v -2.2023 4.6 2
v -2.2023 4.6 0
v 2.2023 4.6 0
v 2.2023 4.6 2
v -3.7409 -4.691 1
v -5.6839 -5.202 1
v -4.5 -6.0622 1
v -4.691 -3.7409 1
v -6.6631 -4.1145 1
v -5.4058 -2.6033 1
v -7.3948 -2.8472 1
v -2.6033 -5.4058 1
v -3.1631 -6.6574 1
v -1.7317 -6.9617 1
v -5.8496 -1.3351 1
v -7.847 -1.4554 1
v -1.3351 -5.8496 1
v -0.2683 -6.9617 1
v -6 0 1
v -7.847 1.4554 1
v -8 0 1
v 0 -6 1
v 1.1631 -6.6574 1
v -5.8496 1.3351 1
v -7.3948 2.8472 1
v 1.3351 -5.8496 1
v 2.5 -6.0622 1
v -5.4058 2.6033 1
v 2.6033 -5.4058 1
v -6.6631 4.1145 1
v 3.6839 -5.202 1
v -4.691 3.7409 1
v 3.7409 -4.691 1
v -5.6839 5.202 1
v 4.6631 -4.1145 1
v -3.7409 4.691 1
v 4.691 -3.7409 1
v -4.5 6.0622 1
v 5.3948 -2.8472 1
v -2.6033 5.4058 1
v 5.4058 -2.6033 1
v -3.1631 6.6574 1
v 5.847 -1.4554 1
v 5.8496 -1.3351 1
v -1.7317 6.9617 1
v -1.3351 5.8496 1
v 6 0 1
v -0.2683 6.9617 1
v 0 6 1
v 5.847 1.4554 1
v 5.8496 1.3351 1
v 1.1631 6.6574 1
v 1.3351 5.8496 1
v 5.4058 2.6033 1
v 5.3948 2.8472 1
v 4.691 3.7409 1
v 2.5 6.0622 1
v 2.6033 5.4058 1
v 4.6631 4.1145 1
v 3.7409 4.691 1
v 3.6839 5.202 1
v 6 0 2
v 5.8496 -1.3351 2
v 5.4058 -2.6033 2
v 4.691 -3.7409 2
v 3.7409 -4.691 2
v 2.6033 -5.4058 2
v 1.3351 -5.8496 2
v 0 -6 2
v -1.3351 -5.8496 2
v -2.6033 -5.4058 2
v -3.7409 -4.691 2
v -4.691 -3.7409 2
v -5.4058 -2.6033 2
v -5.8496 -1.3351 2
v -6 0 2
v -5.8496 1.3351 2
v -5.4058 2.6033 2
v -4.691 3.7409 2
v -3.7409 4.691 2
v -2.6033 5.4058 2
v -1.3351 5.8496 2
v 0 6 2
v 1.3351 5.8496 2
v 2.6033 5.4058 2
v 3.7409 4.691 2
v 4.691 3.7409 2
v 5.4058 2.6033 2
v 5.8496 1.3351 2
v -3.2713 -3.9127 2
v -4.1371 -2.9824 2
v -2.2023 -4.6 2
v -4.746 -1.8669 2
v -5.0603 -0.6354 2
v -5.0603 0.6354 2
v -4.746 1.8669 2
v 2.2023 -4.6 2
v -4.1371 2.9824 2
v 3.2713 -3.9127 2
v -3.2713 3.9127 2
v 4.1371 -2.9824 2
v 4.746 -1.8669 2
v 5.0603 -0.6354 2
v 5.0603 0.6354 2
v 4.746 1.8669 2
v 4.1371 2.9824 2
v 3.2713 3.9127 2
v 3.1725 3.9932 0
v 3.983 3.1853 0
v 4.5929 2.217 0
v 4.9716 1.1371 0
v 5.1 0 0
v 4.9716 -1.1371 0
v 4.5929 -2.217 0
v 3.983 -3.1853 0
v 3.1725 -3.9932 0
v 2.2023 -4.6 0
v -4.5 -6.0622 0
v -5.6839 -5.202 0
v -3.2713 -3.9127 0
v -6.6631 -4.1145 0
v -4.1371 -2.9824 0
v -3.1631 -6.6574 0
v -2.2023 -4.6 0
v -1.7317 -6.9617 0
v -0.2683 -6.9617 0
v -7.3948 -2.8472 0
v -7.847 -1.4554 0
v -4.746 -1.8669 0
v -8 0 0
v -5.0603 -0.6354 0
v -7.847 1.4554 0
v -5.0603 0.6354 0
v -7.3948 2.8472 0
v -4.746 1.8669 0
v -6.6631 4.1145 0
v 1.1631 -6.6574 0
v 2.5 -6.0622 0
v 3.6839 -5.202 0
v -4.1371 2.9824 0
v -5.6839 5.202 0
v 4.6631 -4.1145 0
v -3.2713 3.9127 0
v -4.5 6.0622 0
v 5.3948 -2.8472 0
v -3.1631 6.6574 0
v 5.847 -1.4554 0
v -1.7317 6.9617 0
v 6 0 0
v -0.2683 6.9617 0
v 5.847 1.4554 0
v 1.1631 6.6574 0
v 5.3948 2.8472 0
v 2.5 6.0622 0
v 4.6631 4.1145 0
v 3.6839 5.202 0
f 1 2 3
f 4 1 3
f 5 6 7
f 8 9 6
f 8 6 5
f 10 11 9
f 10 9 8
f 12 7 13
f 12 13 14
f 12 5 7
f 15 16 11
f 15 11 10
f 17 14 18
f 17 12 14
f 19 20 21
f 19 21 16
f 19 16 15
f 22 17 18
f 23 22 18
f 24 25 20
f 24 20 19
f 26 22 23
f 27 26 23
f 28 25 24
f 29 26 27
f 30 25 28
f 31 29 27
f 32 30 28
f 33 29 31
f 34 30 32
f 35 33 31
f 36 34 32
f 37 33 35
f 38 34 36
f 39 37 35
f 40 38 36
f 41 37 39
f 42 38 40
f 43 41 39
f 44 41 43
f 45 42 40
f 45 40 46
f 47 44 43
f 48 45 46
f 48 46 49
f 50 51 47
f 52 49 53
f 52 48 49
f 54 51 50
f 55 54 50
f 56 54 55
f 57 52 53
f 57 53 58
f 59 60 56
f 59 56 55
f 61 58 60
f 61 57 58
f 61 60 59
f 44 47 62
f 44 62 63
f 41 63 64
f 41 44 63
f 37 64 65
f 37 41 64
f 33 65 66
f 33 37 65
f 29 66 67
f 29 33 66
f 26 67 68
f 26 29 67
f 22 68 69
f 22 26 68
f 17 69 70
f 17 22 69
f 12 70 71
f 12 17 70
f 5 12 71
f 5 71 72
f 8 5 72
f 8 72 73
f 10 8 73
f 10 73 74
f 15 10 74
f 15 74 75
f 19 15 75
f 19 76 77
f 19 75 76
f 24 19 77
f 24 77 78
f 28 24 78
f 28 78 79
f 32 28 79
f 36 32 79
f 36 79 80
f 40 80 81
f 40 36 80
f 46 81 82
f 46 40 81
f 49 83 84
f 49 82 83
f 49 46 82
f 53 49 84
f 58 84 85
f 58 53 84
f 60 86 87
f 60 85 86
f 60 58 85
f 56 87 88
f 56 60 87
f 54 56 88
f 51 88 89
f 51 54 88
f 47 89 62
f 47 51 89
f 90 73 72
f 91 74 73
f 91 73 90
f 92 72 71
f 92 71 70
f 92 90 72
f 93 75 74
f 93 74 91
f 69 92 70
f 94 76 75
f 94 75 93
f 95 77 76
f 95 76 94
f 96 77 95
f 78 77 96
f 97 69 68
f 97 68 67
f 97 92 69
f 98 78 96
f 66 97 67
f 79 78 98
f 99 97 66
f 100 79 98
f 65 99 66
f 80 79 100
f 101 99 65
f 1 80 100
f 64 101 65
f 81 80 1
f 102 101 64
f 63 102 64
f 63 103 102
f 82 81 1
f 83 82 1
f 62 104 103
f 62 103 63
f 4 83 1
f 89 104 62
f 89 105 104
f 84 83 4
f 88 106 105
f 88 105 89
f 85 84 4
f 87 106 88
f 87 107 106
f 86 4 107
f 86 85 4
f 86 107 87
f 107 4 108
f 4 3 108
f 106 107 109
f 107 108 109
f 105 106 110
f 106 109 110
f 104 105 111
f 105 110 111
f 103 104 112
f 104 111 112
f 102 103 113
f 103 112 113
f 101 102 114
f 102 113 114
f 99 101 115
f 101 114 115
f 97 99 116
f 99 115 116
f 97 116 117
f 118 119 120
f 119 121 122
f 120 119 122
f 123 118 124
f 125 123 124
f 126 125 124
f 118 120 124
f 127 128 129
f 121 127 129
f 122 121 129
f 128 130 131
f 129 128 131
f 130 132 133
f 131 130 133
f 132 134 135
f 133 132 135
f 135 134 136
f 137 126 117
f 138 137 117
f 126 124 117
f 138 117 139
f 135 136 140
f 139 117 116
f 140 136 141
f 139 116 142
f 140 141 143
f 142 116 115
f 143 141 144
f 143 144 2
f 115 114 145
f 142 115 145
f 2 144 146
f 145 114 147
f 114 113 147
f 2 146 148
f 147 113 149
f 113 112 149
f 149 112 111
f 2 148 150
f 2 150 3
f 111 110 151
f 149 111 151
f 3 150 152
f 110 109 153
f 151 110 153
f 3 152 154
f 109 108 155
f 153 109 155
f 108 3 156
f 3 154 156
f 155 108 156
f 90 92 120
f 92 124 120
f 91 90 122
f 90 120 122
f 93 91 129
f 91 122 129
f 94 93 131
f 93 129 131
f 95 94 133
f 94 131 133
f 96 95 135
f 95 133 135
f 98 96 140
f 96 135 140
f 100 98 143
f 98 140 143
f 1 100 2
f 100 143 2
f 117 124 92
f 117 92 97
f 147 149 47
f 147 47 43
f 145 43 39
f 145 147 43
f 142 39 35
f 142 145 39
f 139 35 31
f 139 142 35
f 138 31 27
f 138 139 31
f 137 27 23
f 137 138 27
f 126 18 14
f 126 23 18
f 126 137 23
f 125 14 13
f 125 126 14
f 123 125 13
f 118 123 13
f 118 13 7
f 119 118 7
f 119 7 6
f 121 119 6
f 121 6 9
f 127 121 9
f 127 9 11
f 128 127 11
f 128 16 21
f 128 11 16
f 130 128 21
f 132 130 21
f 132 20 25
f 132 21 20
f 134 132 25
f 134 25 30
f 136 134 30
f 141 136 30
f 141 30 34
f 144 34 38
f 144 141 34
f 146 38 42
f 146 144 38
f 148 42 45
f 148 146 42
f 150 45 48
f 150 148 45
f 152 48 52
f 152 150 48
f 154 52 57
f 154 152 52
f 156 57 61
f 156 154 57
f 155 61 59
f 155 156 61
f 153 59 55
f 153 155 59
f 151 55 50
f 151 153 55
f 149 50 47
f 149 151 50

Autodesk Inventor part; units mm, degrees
ref_plane "YZ Plane" through (0, 0, 0) normal (1, 0, 0) x (0, 1, 0)
ref_plane "XZ Plane" through (0, 0, 0) normal (0, 1, 0) x (-1, 0, 0)
ref_plane "XY Plane" through (0, 0, 0) normal (0, 0, 1) x (1, 0, 0)
sketch "Sketch1" plane through (0, 0, 0) normal (0, 0, 1) x (1, 0, 0)
  line L0 (-2.2023, 4.6) -> (2.2023, 4.6)
  line L1 (-2.2023, -4.6) -> (2.2023, -4.6)
  line L2 (0, 0) -> (7.7204, 0) construction
  arc A0 (-2.2023, 4.6) -> (-2.2023, -4.6) centre (0, 0) ccw
  arc A1 (2.2023, -4.6) -> (2.2023, 4.6) centre (0, 0) ccw
  line L3 (0, 0) -> (-1, 0)
  circle A2 centre (-1, 0) radius 7
  line L4 (5.1, 0) -> (6, 0)
  dimension "d3" = 14
  dimension "d0" = 9.2
  dimension "d1" = 5.1
  dimension "d2" = 1
  dimension "d9" = 0.9
extrude "Extrusion1" add sketch "Sketch1" along normal blind 1
sketch "Sketch2" plane through (-1, 0, 1) normal (0, 0, 1) x (1, 0, 0)
  arc A0 (3.2023, -4.6) -> (3.2023, 4.6) centre (1, 0) ccw projected
  line L0 (3.2023, -4.6) -> (-1.2023, -4.6) projected
  arc A1 (-1.2023, 4.6) -> (-1.2023, -4.6) centre (1, 0) ccw projected
  line L1 (-1.2023, 4.6) -> (3.2023, 4.6) projected
  circle A2 centre (0, 0) radius 7 projected
  circle A3 centre (1, 0) radius 6
  dimension "d6" = 12
extrude "Extrusion2" add sketch "Sketch2" along normal blind 1 contours A3
properties part number "top_clip" material "ABS Plastic"
